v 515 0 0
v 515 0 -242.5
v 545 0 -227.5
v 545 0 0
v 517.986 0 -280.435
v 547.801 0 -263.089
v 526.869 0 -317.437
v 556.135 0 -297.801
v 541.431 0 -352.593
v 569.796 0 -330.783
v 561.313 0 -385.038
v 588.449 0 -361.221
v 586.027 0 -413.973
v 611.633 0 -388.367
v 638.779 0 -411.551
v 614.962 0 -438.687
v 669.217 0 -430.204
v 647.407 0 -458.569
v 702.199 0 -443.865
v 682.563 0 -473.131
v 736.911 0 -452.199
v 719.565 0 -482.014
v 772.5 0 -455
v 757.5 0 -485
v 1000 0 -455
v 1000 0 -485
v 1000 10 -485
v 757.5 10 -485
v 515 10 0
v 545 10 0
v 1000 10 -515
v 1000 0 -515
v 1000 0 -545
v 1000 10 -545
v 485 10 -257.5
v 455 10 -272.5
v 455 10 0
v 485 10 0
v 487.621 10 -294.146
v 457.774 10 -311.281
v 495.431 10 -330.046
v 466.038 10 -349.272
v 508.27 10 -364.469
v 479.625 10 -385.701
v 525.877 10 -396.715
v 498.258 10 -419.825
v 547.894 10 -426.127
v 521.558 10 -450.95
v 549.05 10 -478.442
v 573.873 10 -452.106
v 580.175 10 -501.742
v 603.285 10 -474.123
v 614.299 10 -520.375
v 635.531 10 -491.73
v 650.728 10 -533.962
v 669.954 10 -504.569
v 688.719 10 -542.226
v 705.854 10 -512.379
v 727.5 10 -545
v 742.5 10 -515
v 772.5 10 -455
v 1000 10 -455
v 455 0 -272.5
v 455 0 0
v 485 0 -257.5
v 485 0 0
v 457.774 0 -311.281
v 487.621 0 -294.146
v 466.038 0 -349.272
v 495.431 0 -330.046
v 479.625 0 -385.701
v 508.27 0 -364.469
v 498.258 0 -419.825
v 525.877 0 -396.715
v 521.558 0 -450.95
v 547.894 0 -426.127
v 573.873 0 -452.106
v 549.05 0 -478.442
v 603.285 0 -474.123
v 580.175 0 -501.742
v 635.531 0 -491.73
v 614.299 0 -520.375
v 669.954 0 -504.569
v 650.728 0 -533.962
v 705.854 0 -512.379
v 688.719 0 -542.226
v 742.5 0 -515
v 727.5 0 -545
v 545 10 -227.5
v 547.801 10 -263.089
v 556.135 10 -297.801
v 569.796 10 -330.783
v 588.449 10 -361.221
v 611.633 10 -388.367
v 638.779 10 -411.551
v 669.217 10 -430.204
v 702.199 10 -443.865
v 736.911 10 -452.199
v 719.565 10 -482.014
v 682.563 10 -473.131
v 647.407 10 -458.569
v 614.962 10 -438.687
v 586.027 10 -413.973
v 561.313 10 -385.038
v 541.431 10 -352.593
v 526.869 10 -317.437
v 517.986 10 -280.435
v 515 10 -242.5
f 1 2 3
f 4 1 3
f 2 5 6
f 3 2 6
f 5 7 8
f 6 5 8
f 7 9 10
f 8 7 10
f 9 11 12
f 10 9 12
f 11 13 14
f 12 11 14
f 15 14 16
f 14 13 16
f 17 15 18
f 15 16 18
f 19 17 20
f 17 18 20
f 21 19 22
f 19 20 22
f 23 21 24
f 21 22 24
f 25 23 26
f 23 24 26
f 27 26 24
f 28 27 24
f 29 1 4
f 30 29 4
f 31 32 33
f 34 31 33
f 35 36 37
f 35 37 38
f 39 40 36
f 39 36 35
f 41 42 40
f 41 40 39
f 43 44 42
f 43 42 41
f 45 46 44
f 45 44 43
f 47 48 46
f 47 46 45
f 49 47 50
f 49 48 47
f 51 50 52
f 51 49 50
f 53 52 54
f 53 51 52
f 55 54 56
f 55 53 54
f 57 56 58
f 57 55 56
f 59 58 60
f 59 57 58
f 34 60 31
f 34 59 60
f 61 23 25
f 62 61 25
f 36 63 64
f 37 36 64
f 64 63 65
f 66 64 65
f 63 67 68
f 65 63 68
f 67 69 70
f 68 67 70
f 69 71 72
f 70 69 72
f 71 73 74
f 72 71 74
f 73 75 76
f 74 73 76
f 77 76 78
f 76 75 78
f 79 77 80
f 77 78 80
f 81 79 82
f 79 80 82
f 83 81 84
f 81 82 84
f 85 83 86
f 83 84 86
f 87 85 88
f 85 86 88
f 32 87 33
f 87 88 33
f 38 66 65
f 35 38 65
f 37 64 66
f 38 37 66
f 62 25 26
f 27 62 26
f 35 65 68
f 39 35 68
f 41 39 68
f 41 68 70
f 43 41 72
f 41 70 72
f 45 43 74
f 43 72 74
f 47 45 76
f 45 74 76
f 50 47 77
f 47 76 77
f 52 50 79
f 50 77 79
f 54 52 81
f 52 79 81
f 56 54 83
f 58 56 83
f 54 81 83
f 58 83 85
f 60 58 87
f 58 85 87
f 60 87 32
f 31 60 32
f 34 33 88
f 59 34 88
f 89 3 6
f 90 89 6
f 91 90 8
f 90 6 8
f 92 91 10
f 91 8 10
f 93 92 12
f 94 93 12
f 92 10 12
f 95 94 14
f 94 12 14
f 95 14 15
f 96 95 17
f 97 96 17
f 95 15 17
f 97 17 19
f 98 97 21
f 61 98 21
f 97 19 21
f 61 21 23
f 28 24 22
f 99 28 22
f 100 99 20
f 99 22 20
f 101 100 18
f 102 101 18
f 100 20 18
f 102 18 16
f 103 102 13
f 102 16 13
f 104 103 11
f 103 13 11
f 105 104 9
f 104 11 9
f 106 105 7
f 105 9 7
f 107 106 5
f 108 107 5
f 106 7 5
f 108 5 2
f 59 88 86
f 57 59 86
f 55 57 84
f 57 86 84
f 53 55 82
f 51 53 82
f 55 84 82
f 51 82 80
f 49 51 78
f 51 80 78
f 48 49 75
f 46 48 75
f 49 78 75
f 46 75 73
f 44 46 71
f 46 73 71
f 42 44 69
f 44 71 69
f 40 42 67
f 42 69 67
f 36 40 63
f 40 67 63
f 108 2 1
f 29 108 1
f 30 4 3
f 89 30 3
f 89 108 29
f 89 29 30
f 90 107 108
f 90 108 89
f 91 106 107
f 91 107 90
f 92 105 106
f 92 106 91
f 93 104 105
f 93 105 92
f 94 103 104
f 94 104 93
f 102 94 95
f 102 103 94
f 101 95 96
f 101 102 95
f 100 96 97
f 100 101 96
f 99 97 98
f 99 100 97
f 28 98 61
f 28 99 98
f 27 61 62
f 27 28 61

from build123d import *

# Parameters (mm, degrees)
BOSS_EXTRUDE1_DEPTH   = 10
BOSS_EXTRUDE1_2_DEPTH = 10


with BuildPart() as part:
    # Sketch2 → Boss-Extrude1 (new body)
    with BuildSketch(Plane(origin=(0, 0, 0), x_dir=(1, 0, 0), z_dir=(0, 1, 0))):
        with BuildLine():
            Line((455, 272.5), (455, 0))
            Line((455, 0), (485, 0))
            Line((485, 0), (485, 257.5))
            ThreePointArc((485, 257.5), (560.420003844, 439.579996156), (742.5, 515))
            Line((742.5, 515), (1000, 515))
            Line((1000, 515), (1000, 545))
            Line((1000, 545), (727.5, 545))
            ThreePointArc((727.5, 545), (534.813402127, 465.186597873), (455, 272.5))
        make_face()
    extrude(amount=BOSS_EXTRUDE1_DEPTH)


with BuildPart() as body_2:
    # Sketch2 → Boss-Extrude1 2 (new body)
    with BuildSketch(Plane(origin=(0, 0, 0), x_dir=(1, 0, 0), z_dir=(0, 1, 0))):
        with BuildLine():
            Line((515, 242.5), (515, 0))
            Line((515, 0), (545, 0))
            Line((545, 0), (545, 227.5))
            ThreePointArc((545, 227.5), (611.63320728, 388.36679272), (772.5, 455))
            Line((772.5, 455), (1000, 455))
            Line((1000, 455), (1000, 485))
            Line((1000, 485), (757.5, 485))
            ThreePointArc((757.5, 485), (586.026605562, 413.973394438), (515, 242.5))
        make_face()
    extrude(amount=BOSS_EXTRUDE1_2_DEPTH)


solid = Compound([part.part, body_2.part])
